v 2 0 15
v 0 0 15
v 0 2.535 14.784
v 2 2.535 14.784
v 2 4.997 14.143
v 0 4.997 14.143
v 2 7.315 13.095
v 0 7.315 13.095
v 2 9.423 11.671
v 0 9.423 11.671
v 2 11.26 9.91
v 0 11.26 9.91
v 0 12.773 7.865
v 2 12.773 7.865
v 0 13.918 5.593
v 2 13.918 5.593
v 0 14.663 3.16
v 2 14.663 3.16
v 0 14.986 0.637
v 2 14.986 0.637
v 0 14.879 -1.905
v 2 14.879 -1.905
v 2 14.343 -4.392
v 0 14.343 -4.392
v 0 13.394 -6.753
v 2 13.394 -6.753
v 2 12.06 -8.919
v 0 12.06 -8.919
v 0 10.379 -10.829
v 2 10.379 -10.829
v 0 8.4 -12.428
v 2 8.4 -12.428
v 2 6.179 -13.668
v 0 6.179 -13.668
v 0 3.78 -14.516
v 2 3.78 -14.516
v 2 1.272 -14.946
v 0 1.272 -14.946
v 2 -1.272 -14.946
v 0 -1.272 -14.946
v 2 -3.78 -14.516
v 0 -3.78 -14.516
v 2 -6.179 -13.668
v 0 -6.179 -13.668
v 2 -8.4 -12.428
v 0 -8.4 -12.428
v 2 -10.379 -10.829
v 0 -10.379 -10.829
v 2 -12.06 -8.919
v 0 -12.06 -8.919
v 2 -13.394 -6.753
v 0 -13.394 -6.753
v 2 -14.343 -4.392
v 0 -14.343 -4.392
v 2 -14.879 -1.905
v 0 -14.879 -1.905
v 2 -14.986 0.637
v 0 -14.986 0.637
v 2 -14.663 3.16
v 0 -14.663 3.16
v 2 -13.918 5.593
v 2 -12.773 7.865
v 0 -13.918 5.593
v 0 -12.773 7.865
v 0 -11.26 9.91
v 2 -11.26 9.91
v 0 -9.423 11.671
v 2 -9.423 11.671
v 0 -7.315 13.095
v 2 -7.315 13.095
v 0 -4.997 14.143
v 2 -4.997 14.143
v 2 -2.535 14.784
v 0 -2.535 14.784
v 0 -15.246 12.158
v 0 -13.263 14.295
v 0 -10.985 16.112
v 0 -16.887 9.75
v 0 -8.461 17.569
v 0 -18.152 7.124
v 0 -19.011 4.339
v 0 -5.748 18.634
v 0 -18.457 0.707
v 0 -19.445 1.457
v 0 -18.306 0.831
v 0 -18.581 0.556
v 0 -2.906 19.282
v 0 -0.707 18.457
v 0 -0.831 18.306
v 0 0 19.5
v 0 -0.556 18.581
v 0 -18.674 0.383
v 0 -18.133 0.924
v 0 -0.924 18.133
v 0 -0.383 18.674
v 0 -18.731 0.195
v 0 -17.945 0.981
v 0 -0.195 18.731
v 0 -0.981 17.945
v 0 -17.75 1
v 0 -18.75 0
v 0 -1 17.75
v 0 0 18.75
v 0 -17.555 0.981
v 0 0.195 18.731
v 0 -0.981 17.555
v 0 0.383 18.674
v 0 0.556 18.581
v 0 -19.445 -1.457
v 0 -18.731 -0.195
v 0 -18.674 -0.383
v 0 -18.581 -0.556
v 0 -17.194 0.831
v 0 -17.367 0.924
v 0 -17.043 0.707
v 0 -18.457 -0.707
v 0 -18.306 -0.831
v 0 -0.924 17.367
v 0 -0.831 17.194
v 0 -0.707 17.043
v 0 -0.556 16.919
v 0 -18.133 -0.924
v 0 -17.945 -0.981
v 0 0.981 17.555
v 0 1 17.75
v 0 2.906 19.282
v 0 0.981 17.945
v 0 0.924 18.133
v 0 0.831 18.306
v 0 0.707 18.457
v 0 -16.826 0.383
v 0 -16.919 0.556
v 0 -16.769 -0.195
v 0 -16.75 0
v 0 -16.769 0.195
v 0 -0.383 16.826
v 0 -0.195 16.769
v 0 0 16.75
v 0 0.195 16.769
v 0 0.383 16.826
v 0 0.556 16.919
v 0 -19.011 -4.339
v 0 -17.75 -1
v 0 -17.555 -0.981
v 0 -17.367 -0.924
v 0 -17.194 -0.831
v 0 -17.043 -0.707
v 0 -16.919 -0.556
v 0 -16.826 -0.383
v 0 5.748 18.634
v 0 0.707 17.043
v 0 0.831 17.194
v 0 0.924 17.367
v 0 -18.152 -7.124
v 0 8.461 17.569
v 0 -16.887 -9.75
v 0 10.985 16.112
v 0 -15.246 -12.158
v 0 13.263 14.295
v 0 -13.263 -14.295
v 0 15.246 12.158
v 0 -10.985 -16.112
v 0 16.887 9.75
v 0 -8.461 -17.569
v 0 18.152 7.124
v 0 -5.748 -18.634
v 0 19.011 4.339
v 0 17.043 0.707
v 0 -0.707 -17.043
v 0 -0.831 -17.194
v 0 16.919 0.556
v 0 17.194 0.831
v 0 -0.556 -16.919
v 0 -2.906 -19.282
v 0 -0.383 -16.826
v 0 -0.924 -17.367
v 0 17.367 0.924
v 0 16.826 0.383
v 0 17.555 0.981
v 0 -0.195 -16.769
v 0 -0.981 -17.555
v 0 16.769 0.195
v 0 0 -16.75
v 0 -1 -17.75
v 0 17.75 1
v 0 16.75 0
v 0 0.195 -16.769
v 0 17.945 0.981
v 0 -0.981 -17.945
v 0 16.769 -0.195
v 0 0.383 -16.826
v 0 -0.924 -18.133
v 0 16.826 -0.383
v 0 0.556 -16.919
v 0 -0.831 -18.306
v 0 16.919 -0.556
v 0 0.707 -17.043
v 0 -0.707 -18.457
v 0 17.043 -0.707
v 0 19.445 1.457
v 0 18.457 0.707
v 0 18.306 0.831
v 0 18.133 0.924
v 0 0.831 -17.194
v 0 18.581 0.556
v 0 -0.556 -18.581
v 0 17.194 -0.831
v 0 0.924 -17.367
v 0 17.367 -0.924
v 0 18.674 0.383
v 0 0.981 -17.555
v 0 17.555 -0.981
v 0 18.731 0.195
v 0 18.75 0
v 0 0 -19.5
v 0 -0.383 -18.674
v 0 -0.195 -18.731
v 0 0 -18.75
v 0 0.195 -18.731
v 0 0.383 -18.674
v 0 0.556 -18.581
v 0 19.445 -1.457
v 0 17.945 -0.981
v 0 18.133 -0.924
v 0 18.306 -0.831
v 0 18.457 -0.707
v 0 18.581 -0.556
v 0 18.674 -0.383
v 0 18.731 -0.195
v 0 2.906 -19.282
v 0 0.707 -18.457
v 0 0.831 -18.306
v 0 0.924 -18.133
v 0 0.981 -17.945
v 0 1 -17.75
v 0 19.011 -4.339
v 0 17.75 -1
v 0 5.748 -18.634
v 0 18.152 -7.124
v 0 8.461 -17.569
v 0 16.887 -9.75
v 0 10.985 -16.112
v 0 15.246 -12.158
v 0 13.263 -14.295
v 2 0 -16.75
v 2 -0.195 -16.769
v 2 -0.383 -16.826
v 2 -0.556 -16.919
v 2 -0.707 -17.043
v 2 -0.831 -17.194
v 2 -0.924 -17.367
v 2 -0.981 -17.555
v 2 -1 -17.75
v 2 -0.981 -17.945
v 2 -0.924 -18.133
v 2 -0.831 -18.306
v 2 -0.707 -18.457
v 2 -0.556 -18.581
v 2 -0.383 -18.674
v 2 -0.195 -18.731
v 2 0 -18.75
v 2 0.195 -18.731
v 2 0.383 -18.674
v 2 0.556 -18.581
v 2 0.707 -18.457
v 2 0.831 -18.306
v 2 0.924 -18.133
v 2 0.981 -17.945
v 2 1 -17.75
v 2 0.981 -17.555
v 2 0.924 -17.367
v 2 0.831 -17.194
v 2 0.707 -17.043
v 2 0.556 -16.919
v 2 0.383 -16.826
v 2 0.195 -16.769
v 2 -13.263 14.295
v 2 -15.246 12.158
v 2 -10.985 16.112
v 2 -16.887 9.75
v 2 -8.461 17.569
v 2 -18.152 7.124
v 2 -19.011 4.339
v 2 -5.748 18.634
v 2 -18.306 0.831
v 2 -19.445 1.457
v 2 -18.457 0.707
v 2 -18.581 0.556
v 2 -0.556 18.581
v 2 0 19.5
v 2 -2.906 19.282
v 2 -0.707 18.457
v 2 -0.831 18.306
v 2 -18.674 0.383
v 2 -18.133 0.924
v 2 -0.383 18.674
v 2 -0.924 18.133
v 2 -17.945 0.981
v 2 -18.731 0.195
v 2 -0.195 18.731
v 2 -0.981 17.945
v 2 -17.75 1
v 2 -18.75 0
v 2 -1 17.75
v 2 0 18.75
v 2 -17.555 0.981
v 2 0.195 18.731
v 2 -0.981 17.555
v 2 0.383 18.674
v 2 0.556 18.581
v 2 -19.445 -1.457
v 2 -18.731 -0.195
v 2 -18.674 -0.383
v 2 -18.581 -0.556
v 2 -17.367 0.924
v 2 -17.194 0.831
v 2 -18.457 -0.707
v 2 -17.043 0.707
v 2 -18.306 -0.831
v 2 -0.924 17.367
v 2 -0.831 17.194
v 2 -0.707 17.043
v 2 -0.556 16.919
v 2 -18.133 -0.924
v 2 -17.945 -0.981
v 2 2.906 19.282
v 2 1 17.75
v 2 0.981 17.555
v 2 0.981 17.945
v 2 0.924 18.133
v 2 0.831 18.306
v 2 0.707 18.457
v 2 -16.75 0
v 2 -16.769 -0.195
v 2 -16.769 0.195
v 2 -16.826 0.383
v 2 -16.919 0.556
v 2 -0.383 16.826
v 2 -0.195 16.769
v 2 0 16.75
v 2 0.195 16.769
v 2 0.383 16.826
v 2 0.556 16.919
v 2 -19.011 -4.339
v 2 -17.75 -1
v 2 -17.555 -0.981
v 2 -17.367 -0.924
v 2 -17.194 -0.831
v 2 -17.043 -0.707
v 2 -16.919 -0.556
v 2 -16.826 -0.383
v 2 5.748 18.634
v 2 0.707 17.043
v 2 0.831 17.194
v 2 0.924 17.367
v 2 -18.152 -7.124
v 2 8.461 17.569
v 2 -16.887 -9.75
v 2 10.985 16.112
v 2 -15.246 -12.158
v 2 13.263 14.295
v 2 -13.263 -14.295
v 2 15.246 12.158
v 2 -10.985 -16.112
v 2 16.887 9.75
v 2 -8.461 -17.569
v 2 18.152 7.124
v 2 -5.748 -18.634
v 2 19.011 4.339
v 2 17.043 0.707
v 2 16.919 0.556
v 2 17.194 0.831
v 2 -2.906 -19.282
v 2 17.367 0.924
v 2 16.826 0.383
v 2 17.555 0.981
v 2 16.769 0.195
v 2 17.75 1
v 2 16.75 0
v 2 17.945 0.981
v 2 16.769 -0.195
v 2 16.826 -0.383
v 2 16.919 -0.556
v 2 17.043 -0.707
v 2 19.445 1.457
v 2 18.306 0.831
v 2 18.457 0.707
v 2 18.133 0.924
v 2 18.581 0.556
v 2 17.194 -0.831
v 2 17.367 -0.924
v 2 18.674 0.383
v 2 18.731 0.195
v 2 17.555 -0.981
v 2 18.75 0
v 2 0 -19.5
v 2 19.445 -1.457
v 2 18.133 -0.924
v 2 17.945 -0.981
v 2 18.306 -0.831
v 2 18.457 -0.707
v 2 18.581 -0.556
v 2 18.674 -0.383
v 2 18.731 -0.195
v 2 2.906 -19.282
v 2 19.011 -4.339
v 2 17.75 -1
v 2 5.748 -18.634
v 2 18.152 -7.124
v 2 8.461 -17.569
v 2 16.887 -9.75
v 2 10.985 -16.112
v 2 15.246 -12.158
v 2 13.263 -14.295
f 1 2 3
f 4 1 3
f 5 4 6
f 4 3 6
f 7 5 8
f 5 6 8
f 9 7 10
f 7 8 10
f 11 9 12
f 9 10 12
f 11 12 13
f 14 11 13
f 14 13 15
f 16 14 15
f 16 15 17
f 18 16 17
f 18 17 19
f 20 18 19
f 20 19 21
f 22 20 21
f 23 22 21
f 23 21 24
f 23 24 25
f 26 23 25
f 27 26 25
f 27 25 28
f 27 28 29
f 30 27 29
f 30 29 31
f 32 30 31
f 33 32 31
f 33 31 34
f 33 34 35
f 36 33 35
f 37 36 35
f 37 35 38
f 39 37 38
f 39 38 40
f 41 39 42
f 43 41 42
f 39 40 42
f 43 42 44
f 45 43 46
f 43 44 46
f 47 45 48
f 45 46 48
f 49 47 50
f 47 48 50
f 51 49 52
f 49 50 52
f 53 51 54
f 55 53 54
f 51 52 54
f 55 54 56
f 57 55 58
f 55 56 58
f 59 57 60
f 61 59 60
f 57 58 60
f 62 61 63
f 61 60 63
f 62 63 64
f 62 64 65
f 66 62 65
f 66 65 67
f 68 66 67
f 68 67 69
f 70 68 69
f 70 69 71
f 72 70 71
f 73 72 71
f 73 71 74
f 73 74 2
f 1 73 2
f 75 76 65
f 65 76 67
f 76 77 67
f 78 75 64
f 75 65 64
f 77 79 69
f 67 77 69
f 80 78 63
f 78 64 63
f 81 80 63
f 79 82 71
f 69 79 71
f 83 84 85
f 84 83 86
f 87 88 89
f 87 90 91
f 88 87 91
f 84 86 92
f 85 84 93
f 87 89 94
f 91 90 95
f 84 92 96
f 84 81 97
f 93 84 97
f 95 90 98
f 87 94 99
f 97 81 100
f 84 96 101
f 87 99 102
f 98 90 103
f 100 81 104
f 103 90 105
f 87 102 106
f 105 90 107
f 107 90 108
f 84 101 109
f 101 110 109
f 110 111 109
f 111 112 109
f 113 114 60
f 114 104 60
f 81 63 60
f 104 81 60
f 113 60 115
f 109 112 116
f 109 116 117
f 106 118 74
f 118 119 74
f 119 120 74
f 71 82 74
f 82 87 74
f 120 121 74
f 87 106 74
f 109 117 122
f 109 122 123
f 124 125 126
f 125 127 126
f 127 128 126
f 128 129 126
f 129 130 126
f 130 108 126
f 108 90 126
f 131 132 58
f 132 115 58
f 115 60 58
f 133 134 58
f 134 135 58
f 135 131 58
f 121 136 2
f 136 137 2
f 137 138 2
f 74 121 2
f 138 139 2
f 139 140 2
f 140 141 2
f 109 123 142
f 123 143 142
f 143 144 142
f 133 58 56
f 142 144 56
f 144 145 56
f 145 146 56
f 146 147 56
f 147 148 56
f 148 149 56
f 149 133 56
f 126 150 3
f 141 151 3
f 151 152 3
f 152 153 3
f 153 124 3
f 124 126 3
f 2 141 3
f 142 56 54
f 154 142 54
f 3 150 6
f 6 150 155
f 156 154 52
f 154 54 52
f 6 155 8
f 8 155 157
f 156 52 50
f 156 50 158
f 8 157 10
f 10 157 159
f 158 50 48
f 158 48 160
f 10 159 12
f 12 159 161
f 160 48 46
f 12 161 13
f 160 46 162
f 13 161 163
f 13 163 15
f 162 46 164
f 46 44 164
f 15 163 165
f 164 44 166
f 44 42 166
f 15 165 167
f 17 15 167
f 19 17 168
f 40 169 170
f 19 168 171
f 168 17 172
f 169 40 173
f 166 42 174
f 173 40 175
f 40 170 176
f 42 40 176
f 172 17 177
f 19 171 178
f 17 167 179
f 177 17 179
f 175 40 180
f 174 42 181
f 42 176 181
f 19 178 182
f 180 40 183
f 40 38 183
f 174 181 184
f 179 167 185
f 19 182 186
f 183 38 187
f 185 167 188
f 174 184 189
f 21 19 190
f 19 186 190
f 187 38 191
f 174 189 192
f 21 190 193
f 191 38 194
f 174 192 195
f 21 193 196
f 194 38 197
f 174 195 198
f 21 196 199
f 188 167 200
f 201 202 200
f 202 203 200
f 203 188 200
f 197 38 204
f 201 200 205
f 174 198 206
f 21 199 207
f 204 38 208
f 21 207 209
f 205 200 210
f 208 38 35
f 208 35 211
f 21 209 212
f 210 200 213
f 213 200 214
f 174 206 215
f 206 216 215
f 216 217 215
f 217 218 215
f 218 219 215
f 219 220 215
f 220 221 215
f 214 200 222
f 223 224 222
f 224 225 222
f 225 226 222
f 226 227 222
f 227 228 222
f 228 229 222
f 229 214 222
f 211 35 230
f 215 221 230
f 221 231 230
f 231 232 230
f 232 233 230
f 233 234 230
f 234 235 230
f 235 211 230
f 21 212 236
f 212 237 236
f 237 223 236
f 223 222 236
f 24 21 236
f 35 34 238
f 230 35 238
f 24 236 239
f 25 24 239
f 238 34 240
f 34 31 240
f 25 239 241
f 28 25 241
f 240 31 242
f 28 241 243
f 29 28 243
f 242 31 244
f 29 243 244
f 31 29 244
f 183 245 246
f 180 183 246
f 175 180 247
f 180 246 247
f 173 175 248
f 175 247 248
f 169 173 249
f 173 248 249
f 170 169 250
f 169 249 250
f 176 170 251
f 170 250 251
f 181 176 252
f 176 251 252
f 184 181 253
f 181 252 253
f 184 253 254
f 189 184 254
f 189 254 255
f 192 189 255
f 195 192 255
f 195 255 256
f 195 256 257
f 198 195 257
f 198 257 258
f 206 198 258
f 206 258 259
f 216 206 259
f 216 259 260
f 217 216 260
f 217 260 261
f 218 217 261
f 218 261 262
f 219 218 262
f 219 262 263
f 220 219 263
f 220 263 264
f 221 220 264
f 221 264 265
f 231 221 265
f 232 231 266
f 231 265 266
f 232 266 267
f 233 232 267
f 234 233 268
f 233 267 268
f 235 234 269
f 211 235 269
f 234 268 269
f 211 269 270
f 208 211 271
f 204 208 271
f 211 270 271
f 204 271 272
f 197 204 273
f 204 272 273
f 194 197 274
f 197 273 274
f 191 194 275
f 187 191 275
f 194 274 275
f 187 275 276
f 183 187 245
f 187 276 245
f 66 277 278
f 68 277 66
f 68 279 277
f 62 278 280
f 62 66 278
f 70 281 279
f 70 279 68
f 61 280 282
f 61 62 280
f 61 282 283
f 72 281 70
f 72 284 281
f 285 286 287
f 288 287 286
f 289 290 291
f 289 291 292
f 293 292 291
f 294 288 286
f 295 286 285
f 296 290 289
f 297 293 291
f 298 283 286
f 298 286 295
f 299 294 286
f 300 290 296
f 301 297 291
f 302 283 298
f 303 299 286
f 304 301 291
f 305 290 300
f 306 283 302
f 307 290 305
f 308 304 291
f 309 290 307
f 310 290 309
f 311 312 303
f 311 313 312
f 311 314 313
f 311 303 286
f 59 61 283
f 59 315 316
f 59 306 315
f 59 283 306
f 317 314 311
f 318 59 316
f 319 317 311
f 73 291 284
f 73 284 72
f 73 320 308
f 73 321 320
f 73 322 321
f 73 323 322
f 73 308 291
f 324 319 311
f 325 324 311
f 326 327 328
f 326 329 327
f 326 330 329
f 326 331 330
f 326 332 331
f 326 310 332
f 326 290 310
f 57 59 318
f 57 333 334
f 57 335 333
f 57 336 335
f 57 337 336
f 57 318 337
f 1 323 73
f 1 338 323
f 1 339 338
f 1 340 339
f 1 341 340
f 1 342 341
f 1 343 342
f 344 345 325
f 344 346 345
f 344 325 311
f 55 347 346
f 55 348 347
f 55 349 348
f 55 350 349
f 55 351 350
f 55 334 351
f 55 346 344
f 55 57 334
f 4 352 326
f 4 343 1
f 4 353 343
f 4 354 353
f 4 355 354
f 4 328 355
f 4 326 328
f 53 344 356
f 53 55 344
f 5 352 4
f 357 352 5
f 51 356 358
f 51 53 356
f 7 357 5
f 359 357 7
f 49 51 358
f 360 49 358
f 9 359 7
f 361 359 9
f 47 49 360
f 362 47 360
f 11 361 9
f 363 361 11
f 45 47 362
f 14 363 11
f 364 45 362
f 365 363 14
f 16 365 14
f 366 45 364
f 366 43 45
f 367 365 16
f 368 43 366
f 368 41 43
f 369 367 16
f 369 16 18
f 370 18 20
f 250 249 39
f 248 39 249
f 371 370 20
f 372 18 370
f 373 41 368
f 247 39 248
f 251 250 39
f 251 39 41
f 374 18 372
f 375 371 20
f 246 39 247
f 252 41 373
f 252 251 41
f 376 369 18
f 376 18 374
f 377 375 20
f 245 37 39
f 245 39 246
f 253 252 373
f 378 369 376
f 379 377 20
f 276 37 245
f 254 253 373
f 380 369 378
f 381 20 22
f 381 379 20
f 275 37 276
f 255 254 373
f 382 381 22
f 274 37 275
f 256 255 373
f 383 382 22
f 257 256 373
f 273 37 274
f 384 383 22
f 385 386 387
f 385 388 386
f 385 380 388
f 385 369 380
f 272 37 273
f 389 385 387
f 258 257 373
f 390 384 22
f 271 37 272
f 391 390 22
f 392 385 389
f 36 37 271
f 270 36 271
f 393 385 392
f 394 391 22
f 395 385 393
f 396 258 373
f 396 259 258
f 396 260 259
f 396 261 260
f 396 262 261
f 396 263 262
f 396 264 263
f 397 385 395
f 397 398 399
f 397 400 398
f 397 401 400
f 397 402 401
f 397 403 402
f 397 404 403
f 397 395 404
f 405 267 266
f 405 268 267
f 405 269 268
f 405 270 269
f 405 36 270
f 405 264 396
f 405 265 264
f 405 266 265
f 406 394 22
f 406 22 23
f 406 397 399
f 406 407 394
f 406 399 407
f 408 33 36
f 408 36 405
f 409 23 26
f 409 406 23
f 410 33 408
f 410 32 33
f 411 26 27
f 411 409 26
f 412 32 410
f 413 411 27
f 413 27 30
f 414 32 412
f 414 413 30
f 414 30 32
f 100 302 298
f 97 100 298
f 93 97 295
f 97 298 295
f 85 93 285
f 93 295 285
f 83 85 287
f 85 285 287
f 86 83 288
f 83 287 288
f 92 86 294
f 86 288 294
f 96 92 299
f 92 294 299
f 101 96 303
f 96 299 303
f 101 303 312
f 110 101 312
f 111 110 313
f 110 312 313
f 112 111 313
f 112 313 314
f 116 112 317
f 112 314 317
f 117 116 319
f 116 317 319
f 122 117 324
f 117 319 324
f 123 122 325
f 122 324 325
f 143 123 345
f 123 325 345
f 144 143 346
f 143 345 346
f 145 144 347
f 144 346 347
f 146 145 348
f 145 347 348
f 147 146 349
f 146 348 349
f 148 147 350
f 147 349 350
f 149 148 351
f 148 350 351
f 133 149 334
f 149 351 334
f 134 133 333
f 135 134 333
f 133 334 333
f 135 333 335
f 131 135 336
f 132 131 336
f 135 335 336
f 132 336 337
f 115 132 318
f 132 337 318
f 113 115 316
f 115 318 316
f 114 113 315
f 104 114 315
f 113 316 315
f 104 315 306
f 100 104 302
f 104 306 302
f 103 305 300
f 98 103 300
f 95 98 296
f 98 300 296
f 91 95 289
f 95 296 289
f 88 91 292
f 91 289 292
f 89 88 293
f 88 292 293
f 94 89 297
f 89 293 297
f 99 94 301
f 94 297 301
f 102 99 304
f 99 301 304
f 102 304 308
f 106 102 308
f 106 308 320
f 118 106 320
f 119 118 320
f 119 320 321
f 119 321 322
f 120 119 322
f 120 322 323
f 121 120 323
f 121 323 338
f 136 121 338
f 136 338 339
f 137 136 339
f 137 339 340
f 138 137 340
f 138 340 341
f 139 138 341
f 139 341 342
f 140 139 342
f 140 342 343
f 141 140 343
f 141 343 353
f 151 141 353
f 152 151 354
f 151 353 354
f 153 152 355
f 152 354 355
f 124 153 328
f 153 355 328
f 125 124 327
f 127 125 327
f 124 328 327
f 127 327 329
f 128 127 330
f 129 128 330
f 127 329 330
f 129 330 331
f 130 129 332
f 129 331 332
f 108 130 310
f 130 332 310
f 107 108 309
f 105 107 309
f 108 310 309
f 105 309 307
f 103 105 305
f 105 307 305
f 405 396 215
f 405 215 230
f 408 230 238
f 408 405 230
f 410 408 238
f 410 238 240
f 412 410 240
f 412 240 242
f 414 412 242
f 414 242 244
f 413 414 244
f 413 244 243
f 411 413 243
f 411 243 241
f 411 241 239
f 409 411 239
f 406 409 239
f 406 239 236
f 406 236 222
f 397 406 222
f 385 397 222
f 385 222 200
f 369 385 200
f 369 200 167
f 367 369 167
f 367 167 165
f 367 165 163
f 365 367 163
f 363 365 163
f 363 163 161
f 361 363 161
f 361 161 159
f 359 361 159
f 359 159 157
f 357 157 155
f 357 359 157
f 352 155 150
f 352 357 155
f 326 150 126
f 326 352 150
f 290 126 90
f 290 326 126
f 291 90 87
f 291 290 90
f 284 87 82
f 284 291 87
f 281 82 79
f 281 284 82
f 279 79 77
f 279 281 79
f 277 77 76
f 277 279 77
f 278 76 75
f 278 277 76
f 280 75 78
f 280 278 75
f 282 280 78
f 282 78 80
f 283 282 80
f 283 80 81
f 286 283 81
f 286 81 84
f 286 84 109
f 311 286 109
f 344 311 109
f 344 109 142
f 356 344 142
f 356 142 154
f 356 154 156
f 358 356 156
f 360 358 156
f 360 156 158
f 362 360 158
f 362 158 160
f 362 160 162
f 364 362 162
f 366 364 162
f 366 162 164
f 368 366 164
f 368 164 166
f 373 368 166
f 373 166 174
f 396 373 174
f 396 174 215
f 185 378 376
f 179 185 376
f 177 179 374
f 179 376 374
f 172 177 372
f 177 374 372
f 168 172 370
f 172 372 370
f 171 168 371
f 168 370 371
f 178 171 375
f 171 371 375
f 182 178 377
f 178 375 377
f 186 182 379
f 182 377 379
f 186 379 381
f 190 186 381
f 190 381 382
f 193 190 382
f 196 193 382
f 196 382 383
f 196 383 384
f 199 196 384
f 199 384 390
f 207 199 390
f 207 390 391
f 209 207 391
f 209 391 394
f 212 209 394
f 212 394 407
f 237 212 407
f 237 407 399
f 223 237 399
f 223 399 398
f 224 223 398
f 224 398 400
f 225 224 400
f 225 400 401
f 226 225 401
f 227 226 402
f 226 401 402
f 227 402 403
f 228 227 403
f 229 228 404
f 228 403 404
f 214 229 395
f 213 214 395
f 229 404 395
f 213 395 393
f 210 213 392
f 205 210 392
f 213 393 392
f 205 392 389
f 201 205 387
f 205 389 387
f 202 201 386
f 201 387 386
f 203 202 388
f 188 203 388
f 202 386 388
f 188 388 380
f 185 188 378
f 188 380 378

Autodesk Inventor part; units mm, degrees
ref_plane "YZ Plane" through (0, 0, 0) normal (1, 0, 0) x (0, 1, 0)
ref_plane "XZ Plane" through (0, 0, 0) normal (0, 1, 0) x (-1, 0, 0)
ref_plane "XY Plane" through (0, 0, 0) normal (0, 0, 1) x (1, 0, 0)
sketch "Sketch1" plane through (0, 0, 0) normal (1, 0, 0) x (0, 1, 0)
  circle A0 centre (0, 0) radius 16
  circle A1 centre (0, 0) radius 19.5
  dimension "d0" = 32
  dimension "d1" = 39
extrude "Extrusion1" add sketch "Sketch1" along normal blind 2 and the other way blind 2 contours A0
sketch "Sketch2" plane through (2, 0, 0) normal (1, 0, 0) x (0, 0, -1)
  circle A0 centre (0, 0) radius 19.5
  circle A1 centre (0, 0) radius 16
  dimension "d6" = 39
extrude "Extrusion2" add sketch "Sketch2" against normal blind 2
sketch "Sketch3" plane through (-2, 0, 0) normal (-1, 0, 0) x (0, 0, 1)
  circle A0 centre (0, 0) radius 16
  circle A1 centre (0, 0) radius 15
  dimension "d9" = 30
extrude "Extrusion3" cut sketch "Sketch3" against normal blind 10 contours A1
sketch "Sketch5" plane through (0, 0, 0) normal (-1, 0, 0) x (0, 0, 1)
  circle A0 centre (0, 0) radius 17.75
  circle A1 centre (0, 17.75) radius 1
  circle A2 centre (-17.75, 0) radius 1
  circle A3 centre (0, -17.75) radius 1
  circle A4 centre (17.75, 0) radius 1
  dimension "d12" = 35.5
  dimension "d13" = 2
  dimension "d16" = 360
hole "Hole1" at (0, 17.75, 0) at (0, 0, 17.75) at (0, -17.75, 0) at (0, 0, -17.75) direction (1, 0, 0) diameter 2 end through all
sketch "Sketch7" plane through (-2, 0, 0) normal (-1, 0, 0) x (0, 0, 1)
  circle A0 centre (0, 0) radius 15
  circle A1 centre (0, 0) radius 16
extrude "Extrusion4" cut sketch "Sketch7" against normal blind 2
properties part number "base_bearing_holder" material "PET Plastic"
